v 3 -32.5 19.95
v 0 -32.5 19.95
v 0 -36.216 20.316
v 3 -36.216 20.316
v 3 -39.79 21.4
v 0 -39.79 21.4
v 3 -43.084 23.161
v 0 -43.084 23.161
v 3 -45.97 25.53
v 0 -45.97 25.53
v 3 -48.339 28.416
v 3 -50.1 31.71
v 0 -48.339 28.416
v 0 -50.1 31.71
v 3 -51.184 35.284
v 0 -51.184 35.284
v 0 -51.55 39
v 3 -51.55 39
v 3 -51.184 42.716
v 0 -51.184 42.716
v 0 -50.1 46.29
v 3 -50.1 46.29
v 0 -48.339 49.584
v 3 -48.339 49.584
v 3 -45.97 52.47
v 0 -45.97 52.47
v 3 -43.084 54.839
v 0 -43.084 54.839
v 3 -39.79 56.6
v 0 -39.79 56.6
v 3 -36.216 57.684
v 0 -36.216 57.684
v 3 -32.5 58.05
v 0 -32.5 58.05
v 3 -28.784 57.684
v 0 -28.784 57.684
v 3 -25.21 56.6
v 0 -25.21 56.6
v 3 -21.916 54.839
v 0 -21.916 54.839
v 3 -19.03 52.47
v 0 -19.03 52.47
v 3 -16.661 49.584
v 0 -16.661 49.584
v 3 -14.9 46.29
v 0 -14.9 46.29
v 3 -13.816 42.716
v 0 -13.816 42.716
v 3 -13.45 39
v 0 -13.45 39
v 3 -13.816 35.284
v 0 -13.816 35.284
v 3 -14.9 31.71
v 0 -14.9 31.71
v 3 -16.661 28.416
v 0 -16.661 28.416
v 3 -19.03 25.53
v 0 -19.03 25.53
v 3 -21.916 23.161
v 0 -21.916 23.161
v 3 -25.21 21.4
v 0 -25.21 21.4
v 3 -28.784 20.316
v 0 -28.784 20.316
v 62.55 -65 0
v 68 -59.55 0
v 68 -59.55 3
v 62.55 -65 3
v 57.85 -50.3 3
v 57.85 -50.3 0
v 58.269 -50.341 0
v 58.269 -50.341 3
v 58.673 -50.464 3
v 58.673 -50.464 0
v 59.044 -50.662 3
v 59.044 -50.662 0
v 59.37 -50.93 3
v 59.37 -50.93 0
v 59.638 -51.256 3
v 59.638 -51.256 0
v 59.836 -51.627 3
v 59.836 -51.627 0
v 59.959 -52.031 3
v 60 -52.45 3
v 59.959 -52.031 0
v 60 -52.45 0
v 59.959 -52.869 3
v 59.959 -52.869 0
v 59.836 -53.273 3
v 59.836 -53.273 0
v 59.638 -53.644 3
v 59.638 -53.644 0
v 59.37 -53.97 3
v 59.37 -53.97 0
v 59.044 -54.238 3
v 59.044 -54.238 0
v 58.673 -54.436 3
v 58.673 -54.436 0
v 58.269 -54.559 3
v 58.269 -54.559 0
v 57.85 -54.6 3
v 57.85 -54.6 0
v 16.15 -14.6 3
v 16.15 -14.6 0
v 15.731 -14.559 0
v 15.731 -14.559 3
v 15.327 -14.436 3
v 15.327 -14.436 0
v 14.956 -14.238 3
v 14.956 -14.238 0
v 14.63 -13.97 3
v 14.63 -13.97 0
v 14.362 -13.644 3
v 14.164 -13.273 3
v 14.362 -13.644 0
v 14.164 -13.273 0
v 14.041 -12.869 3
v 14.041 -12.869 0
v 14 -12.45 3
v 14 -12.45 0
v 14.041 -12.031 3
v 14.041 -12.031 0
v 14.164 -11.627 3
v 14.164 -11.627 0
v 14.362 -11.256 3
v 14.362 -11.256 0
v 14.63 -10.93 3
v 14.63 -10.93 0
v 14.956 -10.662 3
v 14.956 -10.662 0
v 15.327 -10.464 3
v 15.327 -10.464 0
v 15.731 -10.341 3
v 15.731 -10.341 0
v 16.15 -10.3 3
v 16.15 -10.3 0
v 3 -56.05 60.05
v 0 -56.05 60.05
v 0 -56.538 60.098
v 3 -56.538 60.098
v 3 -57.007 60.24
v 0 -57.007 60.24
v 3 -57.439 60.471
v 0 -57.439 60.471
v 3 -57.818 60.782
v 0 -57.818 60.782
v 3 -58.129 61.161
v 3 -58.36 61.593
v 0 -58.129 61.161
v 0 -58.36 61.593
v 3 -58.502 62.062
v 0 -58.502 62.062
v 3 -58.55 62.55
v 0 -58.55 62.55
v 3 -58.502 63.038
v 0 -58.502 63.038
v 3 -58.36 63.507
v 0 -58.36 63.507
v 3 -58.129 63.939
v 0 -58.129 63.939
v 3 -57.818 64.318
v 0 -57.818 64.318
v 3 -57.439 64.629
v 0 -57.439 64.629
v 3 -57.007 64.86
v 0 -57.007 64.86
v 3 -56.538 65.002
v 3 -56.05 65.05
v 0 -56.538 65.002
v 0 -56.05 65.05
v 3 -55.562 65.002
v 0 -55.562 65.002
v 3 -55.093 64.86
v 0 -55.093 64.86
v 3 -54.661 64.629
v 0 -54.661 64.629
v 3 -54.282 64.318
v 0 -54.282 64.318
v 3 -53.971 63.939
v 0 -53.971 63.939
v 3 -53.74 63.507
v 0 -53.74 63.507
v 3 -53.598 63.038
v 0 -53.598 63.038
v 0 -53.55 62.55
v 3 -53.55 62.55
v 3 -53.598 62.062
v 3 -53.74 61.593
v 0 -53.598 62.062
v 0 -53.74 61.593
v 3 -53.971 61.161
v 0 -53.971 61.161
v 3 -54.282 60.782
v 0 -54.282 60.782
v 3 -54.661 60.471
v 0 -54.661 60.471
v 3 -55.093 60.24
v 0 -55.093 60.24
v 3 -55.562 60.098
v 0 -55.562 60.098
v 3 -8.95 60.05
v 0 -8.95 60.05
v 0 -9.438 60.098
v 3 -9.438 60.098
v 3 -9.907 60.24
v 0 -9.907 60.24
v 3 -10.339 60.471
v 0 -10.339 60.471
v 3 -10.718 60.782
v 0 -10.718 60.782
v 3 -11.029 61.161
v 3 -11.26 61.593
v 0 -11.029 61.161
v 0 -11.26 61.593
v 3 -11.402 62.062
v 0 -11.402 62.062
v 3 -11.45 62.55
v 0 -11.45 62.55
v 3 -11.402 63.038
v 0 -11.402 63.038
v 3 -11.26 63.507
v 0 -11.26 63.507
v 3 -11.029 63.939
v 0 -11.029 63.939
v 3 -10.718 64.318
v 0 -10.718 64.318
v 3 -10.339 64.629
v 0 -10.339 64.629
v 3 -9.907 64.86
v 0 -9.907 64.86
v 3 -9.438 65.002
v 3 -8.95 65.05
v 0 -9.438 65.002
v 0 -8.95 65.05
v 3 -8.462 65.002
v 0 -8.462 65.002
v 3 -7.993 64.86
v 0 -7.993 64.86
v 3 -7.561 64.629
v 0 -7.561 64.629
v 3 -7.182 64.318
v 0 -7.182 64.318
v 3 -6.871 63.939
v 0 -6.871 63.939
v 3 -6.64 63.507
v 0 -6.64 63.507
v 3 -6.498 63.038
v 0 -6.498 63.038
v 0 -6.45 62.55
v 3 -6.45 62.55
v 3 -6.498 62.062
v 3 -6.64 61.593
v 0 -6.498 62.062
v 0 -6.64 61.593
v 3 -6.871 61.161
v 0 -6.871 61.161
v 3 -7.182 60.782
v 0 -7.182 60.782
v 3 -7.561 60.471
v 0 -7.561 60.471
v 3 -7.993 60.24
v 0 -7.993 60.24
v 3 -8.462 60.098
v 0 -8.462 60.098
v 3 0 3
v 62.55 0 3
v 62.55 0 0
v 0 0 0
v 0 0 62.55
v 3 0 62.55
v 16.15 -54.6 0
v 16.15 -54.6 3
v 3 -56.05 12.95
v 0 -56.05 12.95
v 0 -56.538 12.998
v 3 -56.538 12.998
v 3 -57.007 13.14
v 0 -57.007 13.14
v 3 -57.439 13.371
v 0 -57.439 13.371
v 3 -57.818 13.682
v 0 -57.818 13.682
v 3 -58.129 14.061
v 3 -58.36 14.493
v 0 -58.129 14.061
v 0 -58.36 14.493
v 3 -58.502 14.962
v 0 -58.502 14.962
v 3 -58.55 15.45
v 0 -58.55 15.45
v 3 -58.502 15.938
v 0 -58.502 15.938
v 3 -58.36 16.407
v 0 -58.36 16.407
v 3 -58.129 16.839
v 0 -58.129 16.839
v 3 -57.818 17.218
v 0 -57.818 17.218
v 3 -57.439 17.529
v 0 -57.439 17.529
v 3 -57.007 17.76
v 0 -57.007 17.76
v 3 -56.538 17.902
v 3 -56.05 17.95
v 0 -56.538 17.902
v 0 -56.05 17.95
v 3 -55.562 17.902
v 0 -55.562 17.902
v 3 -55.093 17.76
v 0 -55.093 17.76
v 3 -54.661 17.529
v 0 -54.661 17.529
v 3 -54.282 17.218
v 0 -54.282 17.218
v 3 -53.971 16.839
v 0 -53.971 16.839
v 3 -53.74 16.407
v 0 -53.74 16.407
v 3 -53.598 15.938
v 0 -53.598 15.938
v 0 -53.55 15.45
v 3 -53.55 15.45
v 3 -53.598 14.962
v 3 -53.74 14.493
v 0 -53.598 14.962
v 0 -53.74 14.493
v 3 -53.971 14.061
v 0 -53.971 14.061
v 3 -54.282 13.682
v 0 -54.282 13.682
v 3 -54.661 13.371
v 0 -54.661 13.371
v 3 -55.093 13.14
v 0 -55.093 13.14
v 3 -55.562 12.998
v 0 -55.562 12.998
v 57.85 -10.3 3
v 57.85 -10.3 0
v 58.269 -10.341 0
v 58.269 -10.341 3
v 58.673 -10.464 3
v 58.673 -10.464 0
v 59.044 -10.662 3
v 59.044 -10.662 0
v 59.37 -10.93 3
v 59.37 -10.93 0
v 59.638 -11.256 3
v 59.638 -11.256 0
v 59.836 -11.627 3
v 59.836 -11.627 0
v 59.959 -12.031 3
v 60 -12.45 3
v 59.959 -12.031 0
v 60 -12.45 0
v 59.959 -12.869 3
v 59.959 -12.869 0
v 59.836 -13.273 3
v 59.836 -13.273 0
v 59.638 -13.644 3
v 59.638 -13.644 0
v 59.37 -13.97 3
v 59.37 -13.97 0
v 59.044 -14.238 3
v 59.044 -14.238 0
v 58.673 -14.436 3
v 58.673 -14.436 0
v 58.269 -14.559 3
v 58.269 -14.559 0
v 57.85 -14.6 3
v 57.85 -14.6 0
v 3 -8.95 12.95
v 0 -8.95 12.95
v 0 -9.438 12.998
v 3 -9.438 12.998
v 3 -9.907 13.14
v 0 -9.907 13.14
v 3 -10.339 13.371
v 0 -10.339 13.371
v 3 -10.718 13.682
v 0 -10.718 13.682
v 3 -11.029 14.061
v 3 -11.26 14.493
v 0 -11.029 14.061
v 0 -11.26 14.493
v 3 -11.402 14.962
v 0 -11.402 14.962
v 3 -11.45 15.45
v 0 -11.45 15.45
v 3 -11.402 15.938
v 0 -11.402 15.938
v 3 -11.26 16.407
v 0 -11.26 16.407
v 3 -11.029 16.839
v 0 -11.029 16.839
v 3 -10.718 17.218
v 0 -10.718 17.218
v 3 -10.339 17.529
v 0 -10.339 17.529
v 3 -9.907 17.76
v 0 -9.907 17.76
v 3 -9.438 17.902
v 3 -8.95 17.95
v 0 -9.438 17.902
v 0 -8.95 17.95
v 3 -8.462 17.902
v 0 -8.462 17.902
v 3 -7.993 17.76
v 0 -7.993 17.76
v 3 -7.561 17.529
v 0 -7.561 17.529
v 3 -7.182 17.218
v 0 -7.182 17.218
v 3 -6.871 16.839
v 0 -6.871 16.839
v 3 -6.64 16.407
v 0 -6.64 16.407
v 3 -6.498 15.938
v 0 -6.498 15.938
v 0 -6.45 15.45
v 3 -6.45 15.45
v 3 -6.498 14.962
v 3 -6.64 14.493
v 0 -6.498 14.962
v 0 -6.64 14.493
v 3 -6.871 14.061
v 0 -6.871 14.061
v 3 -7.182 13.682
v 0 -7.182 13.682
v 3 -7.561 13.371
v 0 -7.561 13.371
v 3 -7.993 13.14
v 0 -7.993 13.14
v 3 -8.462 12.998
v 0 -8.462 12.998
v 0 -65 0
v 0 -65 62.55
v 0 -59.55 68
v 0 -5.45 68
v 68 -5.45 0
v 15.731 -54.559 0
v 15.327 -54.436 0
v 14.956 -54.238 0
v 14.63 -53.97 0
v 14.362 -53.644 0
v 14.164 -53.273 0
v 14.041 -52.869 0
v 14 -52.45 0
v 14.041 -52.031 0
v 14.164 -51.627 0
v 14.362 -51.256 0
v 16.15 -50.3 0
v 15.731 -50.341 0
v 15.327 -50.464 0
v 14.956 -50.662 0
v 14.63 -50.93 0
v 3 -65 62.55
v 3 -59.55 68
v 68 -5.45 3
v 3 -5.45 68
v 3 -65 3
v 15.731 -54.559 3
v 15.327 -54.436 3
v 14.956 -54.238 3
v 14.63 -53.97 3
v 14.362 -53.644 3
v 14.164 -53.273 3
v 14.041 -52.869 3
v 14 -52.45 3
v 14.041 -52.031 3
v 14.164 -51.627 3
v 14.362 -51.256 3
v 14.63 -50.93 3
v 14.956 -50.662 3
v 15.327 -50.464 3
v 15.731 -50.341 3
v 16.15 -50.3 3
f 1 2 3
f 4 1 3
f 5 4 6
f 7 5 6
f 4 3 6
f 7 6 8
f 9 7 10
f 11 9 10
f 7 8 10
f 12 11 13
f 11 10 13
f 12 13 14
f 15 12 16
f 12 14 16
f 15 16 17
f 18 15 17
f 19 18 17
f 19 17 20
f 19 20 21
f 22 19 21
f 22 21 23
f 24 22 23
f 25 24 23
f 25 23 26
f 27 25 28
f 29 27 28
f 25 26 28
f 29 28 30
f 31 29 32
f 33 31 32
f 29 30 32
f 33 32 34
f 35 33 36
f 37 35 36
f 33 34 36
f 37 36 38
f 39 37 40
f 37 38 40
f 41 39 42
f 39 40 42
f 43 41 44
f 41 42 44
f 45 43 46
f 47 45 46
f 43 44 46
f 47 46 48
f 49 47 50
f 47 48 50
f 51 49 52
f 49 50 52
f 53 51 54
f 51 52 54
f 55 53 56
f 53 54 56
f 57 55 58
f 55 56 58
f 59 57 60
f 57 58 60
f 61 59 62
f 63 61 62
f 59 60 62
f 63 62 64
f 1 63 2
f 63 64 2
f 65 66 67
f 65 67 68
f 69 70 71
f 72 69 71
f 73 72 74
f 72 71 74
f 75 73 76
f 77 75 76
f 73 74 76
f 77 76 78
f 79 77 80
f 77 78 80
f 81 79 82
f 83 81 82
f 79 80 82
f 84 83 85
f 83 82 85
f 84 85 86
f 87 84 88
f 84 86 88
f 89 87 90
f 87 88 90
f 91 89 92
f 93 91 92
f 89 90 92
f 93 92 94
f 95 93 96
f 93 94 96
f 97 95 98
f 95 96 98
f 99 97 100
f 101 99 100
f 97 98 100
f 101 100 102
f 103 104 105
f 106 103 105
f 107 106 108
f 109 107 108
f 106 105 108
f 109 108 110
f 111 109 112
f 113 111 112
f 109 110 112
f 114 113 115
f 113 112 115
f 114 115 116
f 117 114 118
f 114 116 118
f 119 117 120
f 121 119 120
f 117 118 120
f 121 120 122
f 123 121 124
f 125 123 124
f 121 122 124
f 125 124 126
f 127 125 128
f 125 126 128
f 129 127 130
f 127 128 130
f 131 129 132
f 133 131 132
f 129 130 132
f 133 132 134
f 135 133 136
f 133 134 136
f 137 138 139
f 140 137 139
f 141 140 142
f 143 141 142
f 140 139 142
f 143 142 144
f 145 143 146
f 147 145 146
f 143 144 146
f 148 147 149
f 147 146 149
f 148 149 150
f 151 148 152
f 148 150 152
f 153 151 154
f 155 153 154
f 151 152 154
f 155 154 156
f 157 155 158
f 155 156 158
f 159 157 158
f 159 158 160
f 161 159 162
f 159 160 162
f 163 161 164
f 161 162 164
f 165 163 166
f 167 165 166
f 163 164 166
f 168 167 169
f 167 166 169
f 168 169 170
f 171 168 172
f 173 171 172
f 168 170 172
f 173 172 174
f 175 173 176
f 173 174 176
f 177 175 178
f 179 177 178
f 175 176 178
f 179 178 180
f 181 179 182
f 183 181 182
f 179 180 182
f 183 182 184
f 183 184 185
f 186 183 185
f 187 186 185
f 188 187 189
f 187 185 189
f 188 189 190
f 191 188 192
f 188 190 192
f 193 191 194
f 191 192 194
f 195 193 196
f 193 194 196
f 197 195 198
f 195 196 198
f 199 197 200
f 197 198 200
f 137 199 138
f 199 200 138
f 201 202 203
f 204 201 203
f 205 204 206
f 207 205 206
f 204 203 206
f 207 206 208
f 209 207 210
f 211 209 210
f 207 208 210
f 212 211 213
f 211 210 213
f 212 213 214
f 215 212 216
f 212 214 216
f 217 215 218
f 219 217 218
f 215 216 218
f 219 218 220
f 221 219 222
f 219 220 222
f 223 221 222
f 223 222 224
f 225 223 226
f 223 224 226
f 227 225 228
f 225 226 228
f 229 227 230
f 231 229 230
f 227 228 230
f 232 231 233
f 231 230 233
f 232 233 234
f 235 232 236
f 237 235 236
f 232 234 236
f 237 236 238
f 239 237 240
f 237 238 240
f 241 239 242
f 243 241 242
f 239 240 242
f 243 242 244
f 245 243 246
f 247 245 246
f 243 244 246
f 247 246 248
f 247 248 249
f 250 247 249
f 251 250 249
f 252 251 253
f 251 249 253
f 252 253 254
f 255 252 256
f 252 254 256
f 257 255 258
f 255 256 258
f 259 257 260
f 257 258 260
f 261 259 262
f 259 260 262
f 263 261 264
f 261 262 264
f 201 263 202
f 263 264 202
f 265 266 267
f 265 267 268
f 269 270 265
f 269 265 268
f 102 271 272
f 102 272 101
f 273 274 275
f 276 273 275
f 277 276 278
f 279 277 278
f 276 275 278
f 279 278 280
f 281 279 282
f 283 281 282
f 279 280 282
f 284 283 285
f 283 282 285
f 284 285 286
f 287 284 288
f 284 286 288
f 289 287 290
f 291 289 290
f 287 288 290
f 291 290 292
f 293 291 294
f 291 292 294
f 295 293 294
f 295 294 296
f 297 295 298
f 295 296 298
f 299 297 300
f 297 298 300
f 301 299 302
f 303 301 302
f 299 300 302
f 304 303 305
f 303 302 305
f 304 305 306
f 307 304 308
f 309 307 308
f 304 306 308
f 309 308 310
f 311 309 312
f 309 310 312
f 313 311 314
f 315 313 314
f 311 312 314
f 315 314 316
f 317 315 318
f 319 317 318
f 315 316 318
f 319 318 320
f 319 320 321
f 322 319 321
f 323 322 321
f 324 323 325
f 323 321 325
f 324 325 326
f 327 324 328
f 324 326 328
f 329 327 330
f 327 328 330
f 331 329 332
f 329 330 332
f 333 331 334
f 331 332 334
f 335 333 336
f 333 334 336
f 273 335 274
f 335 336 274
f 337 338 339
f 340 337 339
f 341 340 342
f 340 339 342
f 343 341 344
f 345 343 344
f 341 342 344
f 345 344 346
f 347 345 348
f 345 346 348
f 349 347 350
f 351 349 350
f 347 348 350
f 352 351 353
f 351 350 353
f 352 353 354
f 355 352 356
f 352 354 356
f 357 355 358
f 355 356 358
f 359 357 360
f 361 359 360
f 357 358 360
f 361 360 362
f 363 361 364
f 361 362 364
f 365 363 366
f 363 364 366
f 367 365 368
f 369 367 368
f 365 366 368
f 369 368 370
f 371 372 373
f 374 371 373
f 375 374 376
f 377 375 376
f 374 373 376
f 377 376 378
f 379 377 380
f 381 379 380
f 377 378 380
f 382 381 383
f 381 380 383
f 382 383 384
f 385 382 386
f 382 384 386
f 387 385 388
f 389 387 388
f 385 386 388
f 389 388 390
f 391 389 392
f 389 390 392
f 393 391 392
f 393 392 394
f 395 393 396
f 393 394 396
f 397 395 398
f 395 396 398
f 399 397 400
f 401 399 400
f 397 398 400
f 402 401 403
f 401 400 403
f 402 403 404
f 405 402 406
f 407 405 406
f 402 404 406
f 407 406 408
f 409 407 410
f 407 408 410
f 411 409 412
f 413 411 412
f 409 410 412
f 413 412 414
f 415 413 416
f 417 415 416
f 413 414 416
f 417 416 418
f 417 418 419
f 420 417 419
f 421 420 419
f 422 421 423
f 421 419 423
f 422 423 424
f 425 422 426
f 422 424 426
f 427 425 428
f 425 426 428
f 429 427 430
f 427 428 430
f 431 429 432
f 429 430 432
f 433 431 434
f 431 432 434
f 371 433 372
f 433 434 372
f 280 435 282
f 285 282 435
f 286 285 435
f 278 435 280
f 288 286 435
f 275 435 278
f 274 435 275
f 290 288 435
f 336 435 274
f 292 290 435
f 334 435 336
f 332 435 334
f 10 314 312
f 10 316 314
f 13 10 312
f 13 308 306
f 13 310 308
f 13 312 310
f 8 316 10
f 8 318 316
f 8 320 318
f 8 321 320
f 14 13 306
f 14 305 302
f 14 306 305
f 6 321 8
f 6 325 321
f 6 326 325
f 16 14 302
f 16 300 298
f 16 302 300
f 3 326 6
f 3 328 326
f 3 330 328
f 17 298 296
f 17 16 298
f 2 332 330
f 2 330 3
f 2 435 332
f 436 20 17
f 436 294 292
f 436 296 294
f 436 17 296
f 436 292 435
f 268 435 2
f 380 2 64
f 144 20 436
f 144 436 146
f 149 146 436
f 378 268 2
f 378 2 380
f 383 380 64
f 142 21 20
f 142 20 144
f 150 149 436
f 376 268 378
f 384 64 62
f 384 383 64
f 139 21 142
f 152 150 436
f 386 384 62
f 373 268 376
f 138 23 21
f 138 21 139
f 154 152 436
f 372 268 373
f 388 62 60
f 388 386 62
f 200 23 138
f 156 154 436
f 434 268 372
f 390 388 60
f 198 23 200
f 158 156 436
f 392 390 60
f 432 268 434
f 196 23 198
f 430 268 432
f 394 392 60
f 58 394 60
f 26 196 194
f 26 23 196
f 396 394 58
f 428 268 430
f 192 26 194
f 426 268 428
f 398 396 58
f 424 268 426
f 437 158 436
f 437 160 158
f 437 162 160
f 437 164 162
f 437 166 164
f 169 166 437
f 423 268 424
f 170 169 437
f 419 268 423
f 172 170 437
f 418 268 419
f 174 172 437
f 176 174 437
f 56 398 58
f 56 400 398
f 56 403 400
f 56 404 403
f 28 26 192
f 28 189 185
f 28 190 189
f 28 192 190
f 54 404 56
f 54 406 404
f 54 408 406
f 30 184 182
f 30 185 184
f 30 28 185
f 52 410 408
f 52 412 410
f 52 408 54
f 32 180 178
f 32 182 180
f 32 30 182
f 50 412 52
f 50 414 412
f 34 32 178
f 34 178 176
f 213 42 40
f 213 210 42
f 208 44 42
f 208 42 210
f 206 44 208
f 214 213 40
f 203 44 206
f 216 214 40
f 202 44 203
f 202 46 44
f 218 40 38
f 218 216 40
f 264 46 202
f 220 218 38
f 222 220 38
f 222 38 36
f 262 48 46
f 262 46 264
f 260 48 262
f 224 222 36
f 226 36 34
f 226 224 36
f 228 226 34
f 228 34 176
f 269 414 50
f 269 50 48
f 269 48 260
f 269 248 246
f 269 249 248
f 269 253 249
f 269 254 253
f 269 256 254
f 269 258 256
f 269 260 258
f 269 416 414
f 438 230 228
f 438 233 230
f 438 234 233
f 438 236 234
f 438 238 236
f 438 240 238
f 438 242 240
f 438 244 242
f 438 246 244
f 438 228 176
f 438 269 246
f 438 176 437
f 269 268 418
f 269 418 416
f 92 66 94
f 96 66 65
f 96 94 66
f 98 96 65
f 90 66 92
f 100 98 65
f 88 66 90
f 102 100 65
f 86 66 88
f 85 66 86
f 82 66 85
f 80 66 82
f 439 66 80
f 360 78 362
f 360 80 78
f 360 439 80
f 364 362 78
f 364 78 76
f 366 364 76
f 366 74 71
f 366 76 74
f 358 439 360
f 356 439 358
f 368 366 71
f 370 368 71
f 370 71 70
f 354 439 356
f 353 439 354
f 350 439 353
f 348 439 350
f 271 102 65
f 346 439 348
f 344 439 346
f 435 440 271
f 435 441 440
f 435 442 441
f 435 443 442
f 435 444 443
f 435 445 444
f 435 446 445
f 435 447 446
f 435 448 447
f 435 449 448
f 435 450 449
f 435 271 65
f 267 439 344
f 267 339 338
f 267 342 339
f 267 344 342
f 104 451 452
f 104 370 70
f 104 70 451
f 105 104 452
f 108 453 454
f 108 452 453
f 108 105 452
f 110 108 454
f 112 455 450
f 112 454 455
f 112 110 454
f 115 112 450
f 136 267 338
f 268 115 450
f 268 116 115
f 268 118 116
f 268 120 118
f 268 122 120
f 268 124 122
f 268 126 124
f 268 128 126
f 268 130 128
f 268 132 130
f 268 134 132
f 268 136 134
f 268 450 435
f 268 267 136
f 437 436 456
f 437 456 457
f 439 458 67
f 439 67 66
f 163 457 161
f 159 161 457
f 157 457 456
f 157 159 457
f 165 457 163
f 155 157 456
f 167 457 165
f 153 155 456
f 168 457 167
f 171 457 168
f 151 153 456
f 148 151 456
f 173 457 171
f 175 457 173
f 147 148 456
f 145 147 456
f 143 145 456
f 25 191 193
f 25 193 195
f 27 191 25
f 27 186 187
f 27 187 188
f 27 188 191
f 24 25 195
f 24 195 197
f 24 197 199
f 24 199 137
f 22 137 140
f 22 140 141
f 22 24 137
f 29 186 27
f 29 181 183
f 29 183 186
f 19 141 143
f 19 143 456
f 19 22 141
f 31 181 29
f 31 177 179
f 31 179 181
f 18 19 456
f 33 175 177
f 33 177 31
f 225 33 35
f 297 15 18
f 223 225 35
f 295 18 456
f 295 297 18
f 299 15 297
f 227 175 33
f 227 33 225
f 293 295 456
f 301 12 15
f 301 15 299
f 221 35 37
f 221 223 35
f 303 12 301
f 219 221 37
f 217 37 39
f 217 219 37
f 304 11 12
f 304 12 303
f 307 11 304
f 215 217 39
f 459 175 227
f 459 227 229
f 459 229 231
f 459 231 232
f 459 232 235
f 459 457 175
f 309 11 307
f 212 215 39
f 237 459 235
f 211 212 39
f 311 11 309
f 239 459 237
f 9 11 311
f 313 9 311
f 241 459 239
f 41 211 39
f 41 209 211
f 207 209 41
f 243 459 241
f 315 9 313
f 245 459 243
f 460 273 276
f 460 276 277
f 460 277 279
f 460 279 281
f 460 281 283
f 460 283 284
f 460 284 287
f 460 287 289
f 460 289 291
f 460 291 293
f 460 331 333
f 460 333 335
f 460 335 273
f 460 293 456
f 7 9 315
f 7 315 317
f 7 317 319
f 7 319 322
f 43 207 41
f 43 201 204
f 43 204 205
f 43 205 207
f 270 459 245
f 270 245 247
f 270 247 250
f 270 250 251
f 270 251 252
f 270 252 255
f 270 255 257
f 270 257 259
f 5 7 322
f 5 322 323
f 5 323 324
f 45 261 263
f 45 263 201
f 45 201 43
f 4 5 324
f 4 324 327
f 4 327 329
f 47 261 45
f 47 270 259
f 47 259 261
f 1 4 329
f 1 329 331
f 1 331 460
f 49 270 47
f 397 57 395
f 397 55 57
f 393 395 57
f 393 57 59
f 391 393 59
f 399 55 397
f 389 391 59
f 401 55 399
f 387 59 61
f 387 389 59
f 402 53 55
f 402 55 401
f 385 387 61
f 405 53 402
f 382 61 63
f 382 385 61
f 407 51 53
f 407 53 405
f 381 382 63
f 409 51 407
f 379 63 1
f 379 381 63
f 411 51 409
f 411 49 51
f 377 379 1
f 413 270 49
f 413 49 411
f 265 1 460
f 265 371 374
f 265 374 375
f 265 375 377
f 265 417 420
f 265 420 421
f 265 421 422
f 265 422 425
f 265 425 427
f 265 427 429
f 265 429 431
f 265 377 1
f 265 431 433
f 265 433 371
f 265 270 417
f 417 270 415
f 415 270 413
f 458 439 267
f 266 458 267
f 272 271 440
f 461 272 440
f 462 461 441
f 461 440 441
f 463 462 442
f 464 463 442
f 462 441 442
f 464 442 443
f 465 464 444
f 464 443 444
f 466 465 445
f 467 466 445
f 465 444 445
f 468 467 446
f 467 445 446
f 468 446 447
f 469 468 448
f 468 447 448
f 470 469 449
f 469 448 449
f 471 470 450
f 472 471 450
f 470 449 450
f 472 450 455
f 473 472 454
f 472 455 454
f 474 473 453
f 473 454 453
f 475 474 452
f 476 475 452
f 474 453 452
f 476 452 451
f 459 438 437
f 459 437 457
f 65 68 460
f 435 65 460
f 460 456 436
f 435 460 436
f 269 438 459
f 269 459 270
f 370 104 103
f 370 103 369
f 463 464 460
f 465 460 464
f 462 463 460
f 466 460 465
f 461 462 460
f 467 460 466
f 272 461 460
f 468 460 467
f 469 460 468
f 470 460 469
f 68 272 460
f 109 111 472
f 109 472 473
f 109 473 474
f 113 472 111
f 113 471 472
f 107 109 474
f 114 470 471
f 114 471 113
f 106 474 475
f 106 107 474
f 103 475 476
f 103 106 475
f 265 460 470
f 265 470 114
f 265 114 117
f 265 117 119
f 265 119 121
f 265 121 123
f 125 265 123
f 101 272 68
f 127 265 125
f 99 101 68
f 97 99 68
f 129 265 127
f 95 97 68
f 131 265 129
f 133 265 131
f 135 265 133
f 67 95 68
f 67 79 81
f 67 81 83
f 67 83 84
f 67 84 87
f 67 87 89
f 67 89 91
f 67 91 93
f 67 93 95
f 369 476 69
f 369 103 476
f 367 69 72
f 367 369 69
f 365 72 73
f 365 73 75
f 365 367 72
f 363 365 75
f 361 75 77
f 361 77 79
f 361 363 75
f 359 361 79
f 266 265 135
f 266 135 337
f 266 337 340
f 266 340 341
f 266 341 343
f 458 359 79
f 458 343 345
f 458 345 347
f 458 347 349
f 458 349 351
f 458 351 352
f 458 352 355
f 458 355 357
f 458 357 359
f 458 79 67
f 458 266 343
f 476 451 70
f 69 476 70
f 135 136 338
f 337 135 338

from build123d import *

# Parameters (mm, degrees)
PAD_DEPTH       = 65
SKETCH001_R     = 19.05
SKETCH001_R_2   = 2.5
POCKET_DEPTH    = 3
POCKET001_DEPTH = 3


with BuildPart() as part:
    # Sketch → Pad (new body)
    with BuildSketch(Plane.XZ):
        Polygon((0, 0), (0, 68), (3, 68), (3, 3), (68, 3), (68, 0), align=None)
    extrude(amount=PAD_DEPTH)

    # Sketch001 (on Face1 of Pad) → Pocket (cut)
    with BuildSketch(Plane(origin=(0, 0, 0), x_dir=(0, 0, -1), z_dir=(-1, 0, 0))):
        with Locations((-39, 32.5)):
            Circle(SKETCH001_R)
        with Locations((-62.55, 56.05)):
            Circle(SKETCH001_R_2)
        with Locations((-62.55, 8.95)):
            Circle(SKETCH001_R_2)
        with Locations((-15.45, 8.95)):
            Circle(SKETCH001_R_2)
        with Locations((-15.45, 56.05)):
            Circle(SKETCH001_R_2)
        Polygon((-62.55, 0), (-68, 0), (-68, 5.45), align=None)
        Polygon((-68, 59.55), (-68, 65), (-62.55, 65), align=None)
    extrude(amount=-POCKET_DEPTH, mode=Mode.SUBTRACT)

    # Sketch002 (on Face7 of Pocket) → Pocket001 (cut)
    with BuildSketch(Plane(origin=(0, 0, 0), x_dir=(1, 0, 0), z_dir=(0, 0, -1))):
        Polygon((62.55, 65), (68, 65), (68, 59.55), align=None)
        Polygon((62.55, 0), (68, 0), (68, 5.45), align=None)
        with BuildLine():
            ThreePointArc((16.15, 54.6), (14, 52.45), (16.15, 50.3))
            Line((16.15, 50.3), (57.85, 50.3))
            ThreePointArc((57.85, 50.3), (60, 52.45), (57.85, 54.6))
            Line((16.15, 54.6), (57.85, 54.6))
        make_face()
        with BuildLine():
            ThreePointArc((16.15, 14.6), (14, 12.45), (16.15, 10.3))
            Line((16.15, 10.3), (57.85, 10.3))
            ThreePointArc((57.85, 10.3), (60, 12.45), (57.85, 14.6))
            Line((16.15, 14.6), (57.85, 14.6))
        make_face()
    extrude(amount=-POCKET001_DEPTH, mode=Mode.SUBTRACT)


solid = part.part
